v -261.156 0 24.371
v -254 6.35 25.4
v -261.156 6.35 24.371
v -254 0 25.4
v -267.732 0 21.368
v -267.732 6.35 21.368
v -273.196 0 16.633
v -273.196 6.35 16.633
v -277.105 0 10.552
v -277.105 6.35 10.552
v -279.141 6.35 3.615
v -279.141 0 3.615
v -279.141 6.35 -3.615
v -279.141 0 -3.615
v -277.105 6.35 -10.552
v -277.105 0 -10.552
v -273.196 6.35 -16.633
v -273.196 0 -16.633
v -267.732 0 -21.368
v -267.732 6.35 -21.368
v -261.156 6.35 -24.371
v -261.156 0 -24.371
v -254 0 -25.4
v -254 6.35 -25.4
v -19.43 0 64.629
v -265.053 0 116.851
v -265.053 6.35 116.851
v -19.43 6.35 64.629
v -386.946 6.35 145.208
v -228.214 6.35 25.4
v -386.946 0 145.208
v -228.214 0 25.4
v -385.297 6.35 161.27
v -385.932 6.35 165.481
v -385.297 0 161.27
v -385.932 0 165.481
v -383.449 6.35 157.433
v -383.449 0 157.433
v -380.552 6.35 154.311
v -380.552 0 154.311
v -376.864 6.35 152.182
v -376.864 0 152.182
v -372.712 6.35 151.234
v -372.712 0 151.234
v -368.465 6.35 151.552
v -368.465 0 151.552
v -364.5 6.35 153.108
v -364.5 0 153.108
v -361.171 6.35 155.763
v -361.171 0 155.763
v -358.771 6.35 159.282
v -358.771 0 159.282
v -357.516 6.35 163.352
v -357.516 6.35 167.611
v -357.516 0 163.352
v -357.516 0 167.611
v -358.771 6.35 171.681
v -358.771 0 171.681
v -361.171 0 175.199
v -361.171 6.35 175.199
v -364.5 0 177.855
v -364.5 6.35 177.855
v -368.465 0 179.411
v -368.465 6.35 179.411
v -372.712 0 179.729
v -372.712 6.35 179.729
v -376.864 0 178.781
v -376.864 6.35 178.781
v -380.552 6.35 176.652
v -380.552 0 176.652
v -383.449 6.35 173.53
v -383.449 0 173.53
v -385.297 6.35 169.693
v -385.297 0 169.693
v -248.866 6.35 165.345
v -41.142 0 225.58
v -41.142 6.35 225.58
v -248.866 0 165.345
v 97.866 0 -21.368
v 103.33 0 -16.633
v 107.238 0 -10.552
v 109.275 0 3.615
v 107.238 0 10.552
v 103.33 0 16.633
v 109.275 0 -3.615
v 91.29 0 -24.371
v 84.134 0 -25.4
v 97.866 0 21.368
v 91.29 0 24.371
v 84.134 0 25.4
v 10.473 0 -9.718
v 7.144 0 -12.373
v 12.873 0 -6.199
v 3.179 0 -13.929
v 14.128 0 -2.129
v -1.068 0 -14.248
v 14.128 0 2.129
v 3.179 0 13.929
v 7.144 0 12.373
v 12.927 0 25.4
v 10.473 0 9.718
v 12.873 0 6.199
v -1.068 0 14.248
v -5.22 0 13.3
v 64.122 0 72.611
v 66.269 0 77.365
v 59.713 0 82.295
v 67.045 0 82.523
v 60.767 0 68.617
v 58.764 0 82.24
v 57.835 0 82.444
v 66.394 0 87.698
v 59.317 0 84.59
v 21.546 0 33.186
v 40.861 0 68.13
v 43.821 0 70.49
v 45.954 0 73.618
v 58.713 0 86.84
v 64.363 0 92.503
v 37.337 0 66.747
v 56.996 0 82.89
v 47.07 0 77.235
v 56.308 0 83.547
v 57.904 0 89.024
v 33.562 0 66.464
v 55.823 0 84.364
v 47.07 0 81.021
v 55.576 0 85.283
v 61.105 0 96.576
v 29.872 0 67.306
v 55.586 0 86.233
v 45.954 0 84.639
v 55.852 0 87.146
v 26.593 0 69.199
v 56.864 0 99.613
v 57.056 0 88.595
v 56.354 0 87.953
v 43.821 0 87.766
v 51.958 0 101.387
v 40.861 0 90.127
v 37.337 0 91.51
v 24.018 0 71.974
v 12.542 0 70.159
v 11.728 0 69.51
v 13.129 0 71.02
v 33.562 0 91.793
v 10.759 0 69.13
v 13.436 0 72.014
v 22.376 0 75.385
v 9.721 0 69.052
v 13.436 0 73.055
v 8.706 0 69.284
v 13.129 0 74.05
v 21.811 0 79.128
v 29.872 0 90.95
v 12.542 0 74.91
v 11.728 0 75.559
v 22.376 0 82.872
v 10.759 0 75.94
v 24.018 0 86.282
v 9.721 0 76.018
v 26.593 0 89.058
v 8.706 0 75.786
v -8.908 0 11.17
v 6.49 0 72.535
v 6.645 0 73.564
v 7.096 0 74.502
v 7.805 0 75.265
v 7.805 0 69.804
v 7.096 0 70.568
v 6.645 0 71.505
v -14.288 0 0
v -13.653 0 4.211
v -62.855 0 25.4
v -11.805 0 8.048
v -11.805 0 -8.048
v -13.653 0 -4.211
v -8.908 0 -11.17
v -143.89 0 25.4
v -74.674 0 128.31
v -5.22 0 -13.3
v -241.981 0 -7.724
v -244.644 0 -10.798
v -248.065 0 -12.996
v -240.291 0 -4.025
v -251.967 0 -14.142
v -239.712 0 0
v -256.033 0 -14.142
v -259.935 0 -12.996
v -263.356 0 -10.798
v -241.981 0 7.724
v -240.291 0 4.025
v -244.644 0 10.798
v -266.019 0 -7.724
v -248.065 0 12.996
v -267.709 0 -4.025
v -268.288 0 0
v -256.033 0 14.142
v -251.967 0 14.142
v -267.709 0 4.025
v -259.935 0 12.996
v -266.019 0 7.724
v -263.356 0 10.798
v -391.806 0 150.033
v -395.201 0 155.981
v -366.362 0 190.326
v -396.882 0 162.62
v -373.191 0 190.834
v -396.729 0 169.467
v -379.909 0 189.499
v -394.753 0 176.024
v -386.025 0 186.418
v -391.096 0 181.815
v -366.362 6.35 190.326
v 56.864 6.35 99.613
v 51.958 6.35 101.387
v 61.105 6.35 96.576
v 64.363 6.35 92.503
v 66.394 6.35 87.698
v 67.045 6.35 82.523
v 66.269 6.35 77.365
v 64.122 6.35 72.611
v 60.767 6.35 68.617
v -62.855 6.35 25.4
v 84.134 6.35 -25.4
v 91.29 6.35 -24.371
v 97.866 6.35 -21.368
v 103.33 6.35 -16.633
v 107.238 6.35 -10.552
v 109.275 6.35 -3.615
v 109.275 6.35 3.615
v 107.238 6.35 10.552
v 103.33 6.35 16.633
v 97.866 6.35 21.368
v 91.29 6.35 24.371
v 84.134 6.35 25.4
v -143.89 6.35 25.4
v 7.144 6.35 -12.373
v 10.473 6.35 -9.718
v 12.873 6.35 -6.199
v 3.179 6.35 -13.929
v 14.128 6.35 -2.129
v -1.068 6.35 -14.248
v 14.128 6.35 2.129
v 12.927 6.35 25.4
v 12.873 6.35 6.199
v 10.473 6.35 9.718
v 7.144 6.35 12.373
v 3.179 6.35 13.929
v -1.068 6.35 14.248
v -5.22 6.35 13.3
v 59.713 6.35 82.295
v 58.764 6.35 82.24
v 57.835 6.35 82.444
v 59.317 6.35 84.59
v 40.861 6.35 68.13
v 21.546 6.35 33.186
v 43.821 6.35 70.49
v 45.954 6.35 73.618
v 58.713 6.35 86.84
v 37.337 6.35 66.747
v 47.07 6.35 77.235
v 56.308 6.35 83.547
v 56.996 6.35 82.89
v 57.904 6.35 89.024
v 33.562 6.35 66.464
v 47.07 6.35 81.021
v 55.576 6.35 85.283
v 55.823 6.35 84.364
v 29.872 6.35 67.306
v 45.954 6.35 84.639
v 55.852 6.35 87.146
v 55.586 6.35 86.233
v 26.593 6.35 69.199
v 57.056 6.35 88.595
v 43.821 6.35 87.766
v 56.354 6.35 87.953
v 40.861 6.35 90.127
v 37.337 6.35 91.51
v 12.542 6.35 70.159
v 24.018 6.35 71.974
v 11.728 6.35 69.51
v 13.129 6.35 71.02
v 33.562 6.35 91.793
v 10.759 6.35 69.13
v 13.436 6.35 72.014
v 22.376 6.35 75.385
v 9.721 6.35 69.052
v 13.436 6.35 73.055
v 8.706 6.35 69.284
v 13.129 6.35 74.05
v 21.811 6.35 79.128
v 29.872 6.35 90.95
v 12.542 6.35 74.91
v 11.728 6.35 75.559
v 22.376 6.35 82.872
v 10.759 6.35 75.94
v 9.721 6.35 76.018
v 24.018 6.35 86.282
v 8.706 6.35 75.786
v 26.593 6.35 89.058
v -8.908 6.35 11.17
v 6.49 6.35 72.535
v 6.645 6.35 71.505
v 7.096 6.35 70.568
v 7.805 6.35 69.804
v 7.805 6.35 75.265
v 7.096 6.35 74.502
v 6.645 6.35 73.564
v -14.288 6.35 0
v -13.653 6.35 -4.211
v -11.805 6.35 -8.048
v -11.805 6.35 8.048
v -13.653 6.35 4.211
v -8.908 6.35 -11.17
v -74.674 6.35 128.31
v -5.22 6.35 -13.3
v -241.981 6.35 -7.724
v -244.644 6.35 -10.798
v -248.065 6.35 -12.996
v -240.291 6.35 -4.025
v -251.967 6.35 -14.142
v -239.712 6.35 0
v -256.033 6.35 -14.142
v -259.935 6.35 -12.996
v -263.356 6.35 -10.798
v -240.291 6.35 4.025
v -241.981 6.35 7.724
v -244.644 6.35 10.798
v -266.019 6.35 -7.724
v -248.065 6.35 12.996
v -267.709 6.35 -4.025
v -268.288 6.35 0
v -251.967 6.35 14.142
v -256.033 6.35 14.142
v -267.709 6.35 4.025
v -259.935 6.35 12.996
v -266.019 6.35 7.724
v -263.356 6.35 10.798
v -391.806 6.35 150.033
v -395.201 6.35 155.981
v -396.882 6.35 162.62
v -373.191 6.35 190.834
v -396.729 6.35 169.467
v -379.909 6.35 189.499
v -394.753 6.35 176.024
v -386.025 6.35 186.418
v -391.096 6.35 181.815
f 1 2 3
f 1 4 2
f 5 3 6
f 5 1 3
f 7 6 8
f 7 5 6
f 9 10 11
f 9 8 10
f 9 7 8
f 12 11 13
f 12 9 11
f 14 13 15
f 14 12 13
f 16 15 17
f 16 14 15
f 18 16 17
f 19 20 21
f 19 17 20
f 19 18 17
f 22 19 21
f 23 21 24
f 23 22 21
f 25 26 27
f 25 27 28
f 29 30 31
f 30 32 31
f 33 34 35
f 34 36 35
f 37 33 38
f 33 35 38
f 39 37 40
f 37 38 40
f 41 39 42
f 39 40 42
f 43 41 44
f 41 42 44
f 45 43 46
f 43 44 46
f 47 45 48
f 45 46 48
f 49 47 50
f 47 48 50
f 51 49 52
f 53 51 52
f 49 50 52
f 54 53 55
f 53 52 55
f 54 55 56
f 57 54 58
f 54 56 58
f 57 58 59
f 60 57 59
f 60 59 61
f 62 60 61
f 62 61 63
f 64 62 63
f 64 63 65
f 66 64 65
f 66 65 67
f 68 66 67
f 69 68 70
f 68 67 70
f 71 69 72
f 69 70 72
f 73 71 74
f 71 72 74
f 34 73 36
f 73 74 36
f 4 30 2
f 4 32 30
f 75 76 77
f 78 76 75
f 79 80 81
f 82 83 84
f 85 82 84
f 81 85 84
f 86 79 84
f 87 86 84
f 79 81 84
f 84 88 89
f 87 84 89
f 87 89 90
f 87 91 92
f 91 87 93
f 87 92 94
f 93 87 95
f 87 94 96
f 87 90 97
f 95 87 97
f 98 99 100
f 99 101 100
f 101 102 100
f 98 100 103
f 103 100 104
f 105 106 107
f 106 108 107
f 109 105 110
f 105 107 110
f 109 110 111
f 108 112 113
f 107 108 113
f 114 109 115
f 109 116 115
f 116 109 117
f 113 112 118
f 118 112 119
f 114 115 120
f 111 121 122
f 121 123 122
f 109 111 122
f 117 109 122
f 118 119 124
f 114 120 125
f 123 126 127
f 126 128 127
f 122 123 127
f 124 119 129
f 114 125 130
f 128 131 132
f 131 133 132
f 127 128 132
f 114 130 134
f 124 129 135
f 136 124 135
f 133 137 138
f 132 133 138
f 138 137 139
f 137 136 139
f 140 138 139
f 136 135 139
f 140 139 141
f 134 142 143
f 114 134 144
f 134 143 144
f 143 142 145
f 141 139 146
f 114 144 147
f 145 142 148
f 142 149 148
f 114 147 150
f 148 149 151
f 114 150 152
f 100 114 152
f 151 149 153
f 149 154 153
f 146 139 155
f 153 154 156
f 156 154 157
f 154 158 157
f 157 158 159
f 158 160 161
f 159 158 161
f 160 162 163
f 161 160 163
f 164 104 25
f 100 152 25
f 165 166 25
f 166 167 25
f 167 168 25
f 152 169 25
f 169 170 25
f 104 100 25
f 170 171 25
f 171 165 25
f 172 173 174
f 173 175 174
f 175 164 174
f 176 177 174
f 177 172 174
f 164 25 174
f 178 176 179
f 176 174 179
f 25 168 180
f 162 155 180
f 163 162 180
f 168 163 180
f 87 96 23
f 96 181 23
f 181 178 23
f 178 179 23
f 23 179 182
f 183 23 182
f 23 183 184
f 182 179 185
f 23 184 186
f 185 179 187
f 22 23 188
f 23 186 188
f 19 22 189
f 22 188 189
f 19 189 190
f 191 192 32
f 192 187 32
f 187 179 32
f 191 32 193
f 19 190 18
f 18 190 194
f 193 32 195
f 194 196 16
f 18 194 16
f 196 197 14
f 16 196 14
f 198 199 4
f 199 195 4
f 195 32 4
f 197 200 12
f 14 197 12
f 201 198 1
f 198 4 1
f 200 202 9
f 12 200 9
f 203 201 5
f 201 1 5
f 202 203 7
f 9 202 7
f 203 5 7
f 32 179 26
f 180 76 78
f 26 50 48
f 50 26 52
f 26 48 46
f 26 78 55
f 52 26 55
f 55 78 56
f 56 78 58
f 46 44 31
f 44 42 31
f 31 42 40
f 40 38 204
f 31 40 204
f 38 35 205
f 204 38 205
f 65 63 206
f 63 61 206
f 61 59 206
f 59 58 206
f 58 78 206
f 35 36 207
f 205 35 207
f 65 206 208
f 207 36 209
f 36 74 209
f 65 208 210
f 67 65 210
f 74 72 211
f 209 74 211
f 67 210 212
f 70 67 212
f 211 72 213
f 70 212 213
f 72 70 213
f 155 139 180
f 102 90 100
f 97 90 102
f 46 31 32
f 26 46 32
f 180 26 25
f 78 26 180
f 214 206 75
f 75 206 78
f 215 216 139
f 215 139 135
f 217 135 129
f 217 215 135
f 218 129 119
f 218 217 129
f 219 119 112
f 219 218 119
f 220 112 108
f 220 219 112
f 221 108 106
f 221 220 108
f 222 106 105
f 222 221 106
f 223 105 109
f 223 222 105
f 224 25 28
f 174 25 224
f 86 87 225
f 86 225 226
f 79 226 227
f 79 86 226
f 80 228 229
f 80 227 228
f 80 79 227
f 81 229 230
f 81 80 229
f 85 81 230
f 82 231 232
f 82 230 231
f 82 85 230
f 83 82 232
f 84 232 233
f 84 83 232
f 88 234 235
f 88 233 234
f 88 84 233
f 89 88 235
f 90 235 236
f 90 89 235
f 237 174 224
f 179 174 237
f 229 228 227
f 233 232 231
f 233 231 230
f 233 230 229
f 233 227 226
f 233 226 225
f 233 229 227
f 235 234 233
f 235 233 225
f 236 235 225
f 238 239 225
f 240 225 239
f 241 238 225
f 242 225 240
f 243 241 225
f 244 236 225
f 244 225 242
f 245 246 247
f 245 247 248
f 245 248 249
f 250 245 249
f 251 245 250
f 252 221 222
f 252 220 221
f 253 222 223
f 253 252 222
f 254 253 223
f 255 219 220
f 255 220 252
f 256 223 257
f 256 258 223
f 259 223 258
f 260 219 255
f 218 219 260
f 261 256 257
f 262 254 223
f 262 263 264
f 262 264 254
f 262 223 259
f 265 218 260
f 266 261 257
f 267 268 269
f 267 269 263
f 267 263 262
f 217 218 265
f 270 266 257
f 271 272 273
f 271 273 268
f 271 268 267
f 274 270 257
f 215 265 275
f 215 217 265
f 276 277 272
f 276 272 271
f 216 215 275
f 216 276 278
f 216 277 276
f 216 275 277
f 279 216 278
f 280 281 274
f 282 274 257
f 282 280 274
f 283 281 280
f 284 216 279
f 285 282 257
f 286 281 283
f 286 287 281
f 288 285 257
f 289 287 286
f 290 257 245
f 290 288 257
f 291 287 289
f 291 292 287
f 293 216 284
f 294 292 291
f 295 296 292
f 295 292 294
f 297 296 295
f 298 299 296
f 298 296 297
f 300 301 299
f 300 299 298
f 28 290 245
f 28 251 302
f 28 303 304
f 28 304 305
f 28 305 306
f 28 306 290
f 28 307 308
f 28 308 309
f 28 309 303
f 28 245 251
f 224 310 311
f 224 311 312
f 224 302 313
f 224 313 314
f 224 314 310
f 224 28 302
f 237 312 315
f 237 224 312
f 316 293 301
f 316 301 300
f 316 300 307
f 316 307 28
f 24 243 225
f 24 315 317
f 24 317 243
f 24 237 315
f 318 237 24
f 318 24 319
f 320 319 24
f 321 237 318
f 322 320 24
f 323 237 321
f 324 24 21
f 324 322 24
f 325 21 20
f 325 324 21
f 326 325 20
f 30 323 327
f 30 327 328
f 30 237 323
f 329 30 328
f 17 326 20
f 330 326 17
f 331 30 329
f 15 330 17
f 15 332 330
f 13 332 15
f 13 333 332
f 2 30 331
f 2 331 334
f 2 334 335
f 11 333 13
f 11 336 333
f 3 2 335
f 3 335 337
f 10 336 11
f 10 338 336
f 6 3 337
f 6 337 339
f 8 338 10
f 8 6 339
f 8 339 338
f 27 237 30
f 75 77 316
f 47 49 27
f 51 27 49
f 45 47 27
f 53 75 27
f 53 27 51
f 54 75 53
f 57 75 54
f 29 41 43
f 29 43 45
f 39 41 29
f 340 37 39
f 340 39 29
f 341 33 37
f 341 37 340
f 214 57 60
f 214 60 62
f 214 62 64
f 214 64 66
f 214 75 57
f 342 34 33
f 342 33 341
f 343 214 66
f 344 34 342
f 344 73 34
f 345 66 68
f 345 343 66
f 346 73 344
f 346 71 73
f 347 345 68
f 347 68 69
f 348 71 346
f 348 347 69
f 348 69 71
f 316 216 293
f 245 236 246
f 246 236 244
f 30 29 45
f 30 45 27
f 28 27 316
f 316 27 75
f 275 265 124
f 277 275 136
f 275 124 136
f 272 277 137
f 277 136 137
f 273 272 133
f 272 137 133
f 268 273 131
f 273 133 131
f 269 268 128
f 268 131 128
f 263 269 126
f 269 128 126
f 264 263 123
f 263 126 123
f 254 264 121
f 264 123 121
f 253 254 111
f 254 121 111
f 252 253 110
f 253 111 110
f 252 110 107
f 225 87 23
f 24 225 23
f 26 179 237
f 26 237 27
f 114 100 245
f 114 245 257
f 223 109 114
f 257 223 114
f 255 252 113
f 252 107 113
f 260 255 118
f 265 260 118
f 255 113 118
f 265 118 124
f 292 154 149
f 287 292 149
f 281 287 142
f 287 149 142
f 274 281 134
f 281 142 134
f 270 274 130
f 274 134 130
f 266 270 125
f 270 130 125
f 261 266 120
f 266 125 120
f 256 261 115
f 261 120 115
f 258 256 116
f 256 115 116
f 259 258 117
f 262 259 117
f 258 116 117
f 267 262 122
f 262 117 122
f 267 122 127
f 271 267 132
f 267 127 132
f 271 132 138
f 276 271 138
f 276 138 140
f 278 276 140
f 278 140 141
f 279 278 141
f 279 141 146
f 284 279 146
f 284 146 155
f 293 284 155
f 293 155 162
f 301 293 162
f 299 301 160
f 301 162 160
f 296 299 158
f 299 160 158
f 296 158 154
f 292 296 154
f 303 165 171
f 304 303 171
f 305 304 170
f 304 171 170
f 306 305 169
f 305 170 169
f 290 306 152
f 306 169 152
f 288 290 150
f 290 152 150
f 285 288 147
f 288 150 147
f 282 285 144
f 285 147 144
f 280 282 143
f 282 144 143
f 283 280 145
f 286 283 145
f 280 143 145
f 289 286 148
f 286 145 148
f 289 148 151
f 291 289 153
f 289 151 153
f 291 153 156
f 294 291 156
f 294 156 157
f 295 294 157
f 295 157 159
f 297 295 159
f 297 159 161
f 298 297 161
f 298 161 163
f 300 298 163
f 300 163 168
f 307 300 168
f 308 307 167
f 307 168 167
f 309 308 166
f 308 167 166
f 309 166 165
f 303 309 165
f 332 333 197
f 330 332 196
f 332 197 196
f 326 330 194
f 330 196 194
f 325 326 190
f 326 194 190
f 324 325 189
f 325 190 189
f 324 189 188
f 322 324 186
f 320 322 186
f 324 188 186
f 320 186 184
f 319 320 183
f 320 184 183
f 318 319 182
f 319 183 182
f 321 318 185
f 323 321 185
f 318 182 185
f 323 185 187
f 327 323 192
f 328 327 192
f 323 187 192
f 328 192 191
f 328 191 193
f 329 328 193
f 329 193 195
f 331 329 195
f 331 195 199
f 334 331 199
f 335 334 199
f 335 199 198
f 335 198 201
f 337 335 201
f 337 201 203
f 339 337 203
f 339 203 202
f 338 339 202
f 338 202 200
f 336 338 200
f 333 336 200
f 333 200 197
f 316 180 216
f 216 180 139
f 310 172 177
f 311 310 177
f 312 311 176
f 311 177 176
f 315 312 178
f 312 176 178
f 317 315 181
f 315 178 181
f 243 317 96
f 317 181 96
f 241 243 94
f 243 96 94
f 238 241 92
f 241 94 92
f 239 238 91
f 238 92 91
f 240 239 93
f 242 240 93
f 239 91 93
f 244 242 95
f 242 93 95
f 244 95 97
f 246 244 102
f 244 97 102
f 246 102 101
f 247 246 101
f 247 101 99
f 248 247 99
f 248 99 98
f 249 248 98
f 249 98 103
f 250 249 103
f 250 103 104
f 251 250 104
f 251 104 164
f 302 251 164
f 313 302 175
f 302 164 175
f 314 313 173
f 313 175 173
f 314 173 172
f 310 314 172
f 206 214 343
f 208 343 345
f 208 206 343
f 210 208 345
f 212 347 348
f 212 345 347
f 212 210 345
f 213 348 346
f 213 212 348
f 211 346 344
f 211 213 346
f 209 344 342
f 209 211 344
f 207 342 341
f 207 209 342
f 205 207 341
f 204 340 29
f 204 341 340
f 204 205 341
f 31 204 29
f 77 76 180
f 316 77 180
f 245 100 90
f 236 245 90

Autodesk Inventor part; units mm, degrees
ref_plane "YZ Plane" through (0, 0, 0) normal (1, 0, 0) x (0, 1, 0)
ref_plane "XZ Plane" through (0, 0, 0) normal (0, 1, 0) x (-1, 0, 0)
ref_plane "XY Plane" through (0, 0, 0) normal (0, 0, 1) x (1, 0, 0)
sketch "Sketch1" plane through (0, 0, 0) normal (0, 1, 0) x (-1, 0, 0)
  line L0 (0, 0) -> (254, 0)
  line L1 (0, -25.4) -> (254, -25.4)
  line L2 (0, 25.4) -> (254, 25.4)
  circle A0 centre (254, 0) radius 25.4
  circle A1 centre (0, 0) radius 25.4
  circle A2 centre (254, 0) radius 14.2875
  circle A3 centre (0, 0) radius 14.2875
  line L3 (76.2, 0) -> (-84.1335, 0)
  line L4 (121.5695, -25.4) -> (-84.1335, -25.4)
  line L5 (40.7781, 25.4) -> (-84.1335, 25.4)
  circle A4 centre (-84.1335, 0) radius 25.4
  line L6 (152.4, 0) -> (371.644, 165.4814)
  line L7 (143.8902, 25.4) -> (356.342, 185.7548)
  line L8 (228.214, 25.4) -> (386.946, 145.208)
  circle A5 centre (371.644, 165.4814) radius 25.4
  circle A6 centre (371.644, 165.4814) radius 14.2875
  circle A7 centre (-34.5114, 79.1283) radius 25.4
  line L9 (53.0811, 0) -> (-34.5114, 79.1283)
  line L10 (13.4025, 70.0738) -> (8.7814, 74.2485)
  line L11 (-4.2871, 17.5951) -> (-21.5461, 33.1863)
  line L12 (-9.1867, 81.0827) -> (-4.2871, 17.5951)
  line L13 (-17.4847, 97.9764) -> (13.4025, 70.0738)
  line L14 (-34.5114, 79.1283) -> (371.644, 165.4814)
  line L15 (366.3617, 190.3261) -> (-88.4526, 93.6275)
  line L16 (-88.4526, 93.6275) -> (19.2621, -3.6785)
  line L17 (409.5559, 199.5096) -> (-88.4526, 93.6275)
  line L18 (-88.4526, 93.6275) -> (-12.9269, 25.4)
  line L19 (419.8284, 149.7582) -> (19.4297, 64.629)
  line L20 (19.4297, 64.629) -> (62.855, 25.4)
  circle A8 centre (-34.5114, 79.1283) radius 12.7
  line L21 (19.4297, 64.629) -> (-88.4526, 93.6275)
  circle A9 centre (-59.0407, 85.7217) radius 3.4925
  circle A10 centre (-9.9821, 72.5349) radius 3.4925
  line L22 (99.5982, 0) -> (99.5982, -97.1111)
  line L23 (99.5982, -97.1111) -> (33.9277, 0)
  line L24 (99.5982, -97.1111) -> (168.3997, 0)
  line L25 (197.5982, 128.4774) -> (41.1424, 225.5805)
  line L26 (41.1424, 225.5805) -> (83.0141, 104.1155)
  line L27 (41.1424, 225.5805) -> (300.5341, 150.3627)
  point P0 (107.1023, -119.4279)
  point P1 (121.5695, -25.4)
  point P2 (2.9551, -25.4)
  point P3 (143.8902, 25.4)
  point P4 (258.2652, 25.0393)
  point P5 (0, 25.4)
  point P6 (16.3526, 37.9742)
  point P7 (0.338, 25.4)
  point P8 (70.7471, 25.4)
  point P9 (4.9006, 69.9742)
  point P10 (-10.4414, 23.1547)
  point P11 (17.5299, 80.8522)
  point P12 (265.0526, 116.8512)
  point P13 (396.2371, 108.5044)
  point P14 (-39.7937, 103.973)
  point P15 (-57.9044, 89.0242)
  point P16 (-51.5382, 60.2802)
  point P17 (-59.7133, 82.2946)
  point P18 (20.6525, 89.1934)
  point P19 (16.5095, 73.5132)
  point P20 (-9.3095, 75.962)
  point P21 (-15.6634, 62.1015)
  point P22 (160.2581, 29.4846)
  point P23 (-11.1184, 69.2324)
  point P24 (382.4437, 141.8098)
  point P25 (376.9262, 140.6367)
  point P26 (323.7481, 129.3305)
  point P27 (186.0521, 25.4)
  point P28 (24.9641, 25.4)
  point P29 (-4.2871, 17.5951)
  point P30 (-12.9269, 25.4)
  point P31 (4.4913, 25.4)
  point P32 (231.3112, 11.4183)
  point P33 (277.9303, 8.5148)
  point P34 (351.3706, 150.1794)
  point P35 (312.9484, 153.0021)
  point P36 (346.7993, 160.1992)
  point P37 (-88.4526, 93.6275)
  point P38 (-2.1293, 19.9838)
  point P39 (-7.1267, 54.3898)
  point P40 (-9.6667, 84.4105)
  point P41 (371.644, 165.4814)
  point P42 (278.63, 6.2067)
  point P43 (230.4586, 9.5373)
  point P44 (-4.8895, 25.4)
  point P45 (60.8476, 25.4)
  point P46 (229.1391, 5.2053)
  point P47 (-12.9269, 25.4)
  point P48 (1.0288, 25.4)
  point P49 (-4.8534, 24.932)
  point P50 (-87.4545, 179.42)
  point P51 (74.6737, 128.31)
  point P52 (248.8661, 165.3452)
  dimension "d0" = 25.4
  dimension "d1" = 25.4
  dimension "d2" = 28.575
  dimension "d3" = 28.575
  dimension "d6" = 254
  dimension "d7" = 76.2
  dimension "d8" = 25.4
  dimension "d9" = 25.4
  dimension "d11" = 50.8
  dimension "d13" = 25.4
  dimension "d14" = 25.4
  dimension "d15" = 50.8
  dimension "d16" = 101.6
  dimension "d18" = 28.575
  dimension "d23" = 50.8
  dimension "d24" = 25.4
  dimension "d25" = 25.4
  dimension "d26" = 25.4
  dimension "d27" = 25.4
  dimension "d28" = 25.4
  dimension "d29" = 25.4
  dimension "d30" = 6.985
  dimension "d31" = 6.985
extrude "Extrusion1" add sketch "Sketch1" along normal blind 6.35 contours L3 A3 L16 L0 | L0 A3 L3 | A3 L16 L0 | L0 A1 L3 A3 | L3 A1 L11 L16 A3 | L16 A3 L12 A1 L0 | L16 A3 | L3 A4 L5 L11 A1 | A1 L4 A4 L3 | A1 L2 L9 L0 | L0 L23 L1 A1 | L11 A1 L12 | L11 L5 L12 A1 | A4 | L0 L22 L1 L23 | L5 L12 L9 L2 | A1 L12 L5 | L11 L16 A7 L9 L12 L5 | L9 L2 L6 L0 | L9 L12 A10 L21 L20 L2 | L22 L0 L24 L1 | L9 A7 A10 L12 | L16 L21 A9 A7 | A7 A9 L21 A8 L9 | L24 L0 A0 L1 | L20 L19 L7 L2 | L9 A8 L21 A10 A7 | A10 A7 L21 L12 | L12 L21 A10 | A9 L21 A7 | A7 L21 A9 | L15 A7 A9 L21 | L6 L2 A0 L0 | A2 | A0 | L7 L19 L6 L2 | L21 A10 L12 A7 L14 L7 L19 | A10 L21 A7 | A8 L21 L9 | L9 L21 A8 | L21 A7 A10 L12 | L12 A10 L21 | L21 A9 A7 | A7 A9 L21 | A9 A7 L14 A8 L21 | L15 L26 L14 L13 A7 | L6 L19 L8 L2 | L7 L14 A5 L6 L19 | L21 A10 A7 | L21 A8 L14 A7 A10 | L21 A8 L14 | L14 A8 L21 | A10 A7 L12 | L13 L14 A7 | L26 L25 L15 | L15 L25 L14 L26 | L6 A5 L19 | L14 L27 L15 A5 L7 | L7 A5 L14 | L25 L27 L15 | L15 L27 L14 L25 | L19 A5 L8 | A5 L14 A6 L6 | L6 A6 L14 A5 | A6 L14 L6 | L6 L14 A6
extrude "Extrusion2" cut sketch "Sketch1" along normal through all contours L3 A3 L16 L0 | L0 A3 L3 | L16 A3 | L20 L19 L7 L2 | A10 A7 L21 L12 | L12 L21 A10 | A7 L21 A9 | A2 | A10 L21 A7 | A8 L21 L9 | L9 L21 A8 | L21 A7 A10 L12 | L12 A10 L21 | A7 A9 L21 | L21 A10 A7 | L21 A8 L14 | L14 A8 L21 | A6 L14 L6 | L6 L14 A6 picked at (-58.0988, 84.8098) picked at (-57.7672, 86.0943)
fillet "Fillet2" radius 19.05 1 edges at (88.4526, 3.175, 93.6275)
equation "\"d0\" = d1"
properties part number "intake-1"
